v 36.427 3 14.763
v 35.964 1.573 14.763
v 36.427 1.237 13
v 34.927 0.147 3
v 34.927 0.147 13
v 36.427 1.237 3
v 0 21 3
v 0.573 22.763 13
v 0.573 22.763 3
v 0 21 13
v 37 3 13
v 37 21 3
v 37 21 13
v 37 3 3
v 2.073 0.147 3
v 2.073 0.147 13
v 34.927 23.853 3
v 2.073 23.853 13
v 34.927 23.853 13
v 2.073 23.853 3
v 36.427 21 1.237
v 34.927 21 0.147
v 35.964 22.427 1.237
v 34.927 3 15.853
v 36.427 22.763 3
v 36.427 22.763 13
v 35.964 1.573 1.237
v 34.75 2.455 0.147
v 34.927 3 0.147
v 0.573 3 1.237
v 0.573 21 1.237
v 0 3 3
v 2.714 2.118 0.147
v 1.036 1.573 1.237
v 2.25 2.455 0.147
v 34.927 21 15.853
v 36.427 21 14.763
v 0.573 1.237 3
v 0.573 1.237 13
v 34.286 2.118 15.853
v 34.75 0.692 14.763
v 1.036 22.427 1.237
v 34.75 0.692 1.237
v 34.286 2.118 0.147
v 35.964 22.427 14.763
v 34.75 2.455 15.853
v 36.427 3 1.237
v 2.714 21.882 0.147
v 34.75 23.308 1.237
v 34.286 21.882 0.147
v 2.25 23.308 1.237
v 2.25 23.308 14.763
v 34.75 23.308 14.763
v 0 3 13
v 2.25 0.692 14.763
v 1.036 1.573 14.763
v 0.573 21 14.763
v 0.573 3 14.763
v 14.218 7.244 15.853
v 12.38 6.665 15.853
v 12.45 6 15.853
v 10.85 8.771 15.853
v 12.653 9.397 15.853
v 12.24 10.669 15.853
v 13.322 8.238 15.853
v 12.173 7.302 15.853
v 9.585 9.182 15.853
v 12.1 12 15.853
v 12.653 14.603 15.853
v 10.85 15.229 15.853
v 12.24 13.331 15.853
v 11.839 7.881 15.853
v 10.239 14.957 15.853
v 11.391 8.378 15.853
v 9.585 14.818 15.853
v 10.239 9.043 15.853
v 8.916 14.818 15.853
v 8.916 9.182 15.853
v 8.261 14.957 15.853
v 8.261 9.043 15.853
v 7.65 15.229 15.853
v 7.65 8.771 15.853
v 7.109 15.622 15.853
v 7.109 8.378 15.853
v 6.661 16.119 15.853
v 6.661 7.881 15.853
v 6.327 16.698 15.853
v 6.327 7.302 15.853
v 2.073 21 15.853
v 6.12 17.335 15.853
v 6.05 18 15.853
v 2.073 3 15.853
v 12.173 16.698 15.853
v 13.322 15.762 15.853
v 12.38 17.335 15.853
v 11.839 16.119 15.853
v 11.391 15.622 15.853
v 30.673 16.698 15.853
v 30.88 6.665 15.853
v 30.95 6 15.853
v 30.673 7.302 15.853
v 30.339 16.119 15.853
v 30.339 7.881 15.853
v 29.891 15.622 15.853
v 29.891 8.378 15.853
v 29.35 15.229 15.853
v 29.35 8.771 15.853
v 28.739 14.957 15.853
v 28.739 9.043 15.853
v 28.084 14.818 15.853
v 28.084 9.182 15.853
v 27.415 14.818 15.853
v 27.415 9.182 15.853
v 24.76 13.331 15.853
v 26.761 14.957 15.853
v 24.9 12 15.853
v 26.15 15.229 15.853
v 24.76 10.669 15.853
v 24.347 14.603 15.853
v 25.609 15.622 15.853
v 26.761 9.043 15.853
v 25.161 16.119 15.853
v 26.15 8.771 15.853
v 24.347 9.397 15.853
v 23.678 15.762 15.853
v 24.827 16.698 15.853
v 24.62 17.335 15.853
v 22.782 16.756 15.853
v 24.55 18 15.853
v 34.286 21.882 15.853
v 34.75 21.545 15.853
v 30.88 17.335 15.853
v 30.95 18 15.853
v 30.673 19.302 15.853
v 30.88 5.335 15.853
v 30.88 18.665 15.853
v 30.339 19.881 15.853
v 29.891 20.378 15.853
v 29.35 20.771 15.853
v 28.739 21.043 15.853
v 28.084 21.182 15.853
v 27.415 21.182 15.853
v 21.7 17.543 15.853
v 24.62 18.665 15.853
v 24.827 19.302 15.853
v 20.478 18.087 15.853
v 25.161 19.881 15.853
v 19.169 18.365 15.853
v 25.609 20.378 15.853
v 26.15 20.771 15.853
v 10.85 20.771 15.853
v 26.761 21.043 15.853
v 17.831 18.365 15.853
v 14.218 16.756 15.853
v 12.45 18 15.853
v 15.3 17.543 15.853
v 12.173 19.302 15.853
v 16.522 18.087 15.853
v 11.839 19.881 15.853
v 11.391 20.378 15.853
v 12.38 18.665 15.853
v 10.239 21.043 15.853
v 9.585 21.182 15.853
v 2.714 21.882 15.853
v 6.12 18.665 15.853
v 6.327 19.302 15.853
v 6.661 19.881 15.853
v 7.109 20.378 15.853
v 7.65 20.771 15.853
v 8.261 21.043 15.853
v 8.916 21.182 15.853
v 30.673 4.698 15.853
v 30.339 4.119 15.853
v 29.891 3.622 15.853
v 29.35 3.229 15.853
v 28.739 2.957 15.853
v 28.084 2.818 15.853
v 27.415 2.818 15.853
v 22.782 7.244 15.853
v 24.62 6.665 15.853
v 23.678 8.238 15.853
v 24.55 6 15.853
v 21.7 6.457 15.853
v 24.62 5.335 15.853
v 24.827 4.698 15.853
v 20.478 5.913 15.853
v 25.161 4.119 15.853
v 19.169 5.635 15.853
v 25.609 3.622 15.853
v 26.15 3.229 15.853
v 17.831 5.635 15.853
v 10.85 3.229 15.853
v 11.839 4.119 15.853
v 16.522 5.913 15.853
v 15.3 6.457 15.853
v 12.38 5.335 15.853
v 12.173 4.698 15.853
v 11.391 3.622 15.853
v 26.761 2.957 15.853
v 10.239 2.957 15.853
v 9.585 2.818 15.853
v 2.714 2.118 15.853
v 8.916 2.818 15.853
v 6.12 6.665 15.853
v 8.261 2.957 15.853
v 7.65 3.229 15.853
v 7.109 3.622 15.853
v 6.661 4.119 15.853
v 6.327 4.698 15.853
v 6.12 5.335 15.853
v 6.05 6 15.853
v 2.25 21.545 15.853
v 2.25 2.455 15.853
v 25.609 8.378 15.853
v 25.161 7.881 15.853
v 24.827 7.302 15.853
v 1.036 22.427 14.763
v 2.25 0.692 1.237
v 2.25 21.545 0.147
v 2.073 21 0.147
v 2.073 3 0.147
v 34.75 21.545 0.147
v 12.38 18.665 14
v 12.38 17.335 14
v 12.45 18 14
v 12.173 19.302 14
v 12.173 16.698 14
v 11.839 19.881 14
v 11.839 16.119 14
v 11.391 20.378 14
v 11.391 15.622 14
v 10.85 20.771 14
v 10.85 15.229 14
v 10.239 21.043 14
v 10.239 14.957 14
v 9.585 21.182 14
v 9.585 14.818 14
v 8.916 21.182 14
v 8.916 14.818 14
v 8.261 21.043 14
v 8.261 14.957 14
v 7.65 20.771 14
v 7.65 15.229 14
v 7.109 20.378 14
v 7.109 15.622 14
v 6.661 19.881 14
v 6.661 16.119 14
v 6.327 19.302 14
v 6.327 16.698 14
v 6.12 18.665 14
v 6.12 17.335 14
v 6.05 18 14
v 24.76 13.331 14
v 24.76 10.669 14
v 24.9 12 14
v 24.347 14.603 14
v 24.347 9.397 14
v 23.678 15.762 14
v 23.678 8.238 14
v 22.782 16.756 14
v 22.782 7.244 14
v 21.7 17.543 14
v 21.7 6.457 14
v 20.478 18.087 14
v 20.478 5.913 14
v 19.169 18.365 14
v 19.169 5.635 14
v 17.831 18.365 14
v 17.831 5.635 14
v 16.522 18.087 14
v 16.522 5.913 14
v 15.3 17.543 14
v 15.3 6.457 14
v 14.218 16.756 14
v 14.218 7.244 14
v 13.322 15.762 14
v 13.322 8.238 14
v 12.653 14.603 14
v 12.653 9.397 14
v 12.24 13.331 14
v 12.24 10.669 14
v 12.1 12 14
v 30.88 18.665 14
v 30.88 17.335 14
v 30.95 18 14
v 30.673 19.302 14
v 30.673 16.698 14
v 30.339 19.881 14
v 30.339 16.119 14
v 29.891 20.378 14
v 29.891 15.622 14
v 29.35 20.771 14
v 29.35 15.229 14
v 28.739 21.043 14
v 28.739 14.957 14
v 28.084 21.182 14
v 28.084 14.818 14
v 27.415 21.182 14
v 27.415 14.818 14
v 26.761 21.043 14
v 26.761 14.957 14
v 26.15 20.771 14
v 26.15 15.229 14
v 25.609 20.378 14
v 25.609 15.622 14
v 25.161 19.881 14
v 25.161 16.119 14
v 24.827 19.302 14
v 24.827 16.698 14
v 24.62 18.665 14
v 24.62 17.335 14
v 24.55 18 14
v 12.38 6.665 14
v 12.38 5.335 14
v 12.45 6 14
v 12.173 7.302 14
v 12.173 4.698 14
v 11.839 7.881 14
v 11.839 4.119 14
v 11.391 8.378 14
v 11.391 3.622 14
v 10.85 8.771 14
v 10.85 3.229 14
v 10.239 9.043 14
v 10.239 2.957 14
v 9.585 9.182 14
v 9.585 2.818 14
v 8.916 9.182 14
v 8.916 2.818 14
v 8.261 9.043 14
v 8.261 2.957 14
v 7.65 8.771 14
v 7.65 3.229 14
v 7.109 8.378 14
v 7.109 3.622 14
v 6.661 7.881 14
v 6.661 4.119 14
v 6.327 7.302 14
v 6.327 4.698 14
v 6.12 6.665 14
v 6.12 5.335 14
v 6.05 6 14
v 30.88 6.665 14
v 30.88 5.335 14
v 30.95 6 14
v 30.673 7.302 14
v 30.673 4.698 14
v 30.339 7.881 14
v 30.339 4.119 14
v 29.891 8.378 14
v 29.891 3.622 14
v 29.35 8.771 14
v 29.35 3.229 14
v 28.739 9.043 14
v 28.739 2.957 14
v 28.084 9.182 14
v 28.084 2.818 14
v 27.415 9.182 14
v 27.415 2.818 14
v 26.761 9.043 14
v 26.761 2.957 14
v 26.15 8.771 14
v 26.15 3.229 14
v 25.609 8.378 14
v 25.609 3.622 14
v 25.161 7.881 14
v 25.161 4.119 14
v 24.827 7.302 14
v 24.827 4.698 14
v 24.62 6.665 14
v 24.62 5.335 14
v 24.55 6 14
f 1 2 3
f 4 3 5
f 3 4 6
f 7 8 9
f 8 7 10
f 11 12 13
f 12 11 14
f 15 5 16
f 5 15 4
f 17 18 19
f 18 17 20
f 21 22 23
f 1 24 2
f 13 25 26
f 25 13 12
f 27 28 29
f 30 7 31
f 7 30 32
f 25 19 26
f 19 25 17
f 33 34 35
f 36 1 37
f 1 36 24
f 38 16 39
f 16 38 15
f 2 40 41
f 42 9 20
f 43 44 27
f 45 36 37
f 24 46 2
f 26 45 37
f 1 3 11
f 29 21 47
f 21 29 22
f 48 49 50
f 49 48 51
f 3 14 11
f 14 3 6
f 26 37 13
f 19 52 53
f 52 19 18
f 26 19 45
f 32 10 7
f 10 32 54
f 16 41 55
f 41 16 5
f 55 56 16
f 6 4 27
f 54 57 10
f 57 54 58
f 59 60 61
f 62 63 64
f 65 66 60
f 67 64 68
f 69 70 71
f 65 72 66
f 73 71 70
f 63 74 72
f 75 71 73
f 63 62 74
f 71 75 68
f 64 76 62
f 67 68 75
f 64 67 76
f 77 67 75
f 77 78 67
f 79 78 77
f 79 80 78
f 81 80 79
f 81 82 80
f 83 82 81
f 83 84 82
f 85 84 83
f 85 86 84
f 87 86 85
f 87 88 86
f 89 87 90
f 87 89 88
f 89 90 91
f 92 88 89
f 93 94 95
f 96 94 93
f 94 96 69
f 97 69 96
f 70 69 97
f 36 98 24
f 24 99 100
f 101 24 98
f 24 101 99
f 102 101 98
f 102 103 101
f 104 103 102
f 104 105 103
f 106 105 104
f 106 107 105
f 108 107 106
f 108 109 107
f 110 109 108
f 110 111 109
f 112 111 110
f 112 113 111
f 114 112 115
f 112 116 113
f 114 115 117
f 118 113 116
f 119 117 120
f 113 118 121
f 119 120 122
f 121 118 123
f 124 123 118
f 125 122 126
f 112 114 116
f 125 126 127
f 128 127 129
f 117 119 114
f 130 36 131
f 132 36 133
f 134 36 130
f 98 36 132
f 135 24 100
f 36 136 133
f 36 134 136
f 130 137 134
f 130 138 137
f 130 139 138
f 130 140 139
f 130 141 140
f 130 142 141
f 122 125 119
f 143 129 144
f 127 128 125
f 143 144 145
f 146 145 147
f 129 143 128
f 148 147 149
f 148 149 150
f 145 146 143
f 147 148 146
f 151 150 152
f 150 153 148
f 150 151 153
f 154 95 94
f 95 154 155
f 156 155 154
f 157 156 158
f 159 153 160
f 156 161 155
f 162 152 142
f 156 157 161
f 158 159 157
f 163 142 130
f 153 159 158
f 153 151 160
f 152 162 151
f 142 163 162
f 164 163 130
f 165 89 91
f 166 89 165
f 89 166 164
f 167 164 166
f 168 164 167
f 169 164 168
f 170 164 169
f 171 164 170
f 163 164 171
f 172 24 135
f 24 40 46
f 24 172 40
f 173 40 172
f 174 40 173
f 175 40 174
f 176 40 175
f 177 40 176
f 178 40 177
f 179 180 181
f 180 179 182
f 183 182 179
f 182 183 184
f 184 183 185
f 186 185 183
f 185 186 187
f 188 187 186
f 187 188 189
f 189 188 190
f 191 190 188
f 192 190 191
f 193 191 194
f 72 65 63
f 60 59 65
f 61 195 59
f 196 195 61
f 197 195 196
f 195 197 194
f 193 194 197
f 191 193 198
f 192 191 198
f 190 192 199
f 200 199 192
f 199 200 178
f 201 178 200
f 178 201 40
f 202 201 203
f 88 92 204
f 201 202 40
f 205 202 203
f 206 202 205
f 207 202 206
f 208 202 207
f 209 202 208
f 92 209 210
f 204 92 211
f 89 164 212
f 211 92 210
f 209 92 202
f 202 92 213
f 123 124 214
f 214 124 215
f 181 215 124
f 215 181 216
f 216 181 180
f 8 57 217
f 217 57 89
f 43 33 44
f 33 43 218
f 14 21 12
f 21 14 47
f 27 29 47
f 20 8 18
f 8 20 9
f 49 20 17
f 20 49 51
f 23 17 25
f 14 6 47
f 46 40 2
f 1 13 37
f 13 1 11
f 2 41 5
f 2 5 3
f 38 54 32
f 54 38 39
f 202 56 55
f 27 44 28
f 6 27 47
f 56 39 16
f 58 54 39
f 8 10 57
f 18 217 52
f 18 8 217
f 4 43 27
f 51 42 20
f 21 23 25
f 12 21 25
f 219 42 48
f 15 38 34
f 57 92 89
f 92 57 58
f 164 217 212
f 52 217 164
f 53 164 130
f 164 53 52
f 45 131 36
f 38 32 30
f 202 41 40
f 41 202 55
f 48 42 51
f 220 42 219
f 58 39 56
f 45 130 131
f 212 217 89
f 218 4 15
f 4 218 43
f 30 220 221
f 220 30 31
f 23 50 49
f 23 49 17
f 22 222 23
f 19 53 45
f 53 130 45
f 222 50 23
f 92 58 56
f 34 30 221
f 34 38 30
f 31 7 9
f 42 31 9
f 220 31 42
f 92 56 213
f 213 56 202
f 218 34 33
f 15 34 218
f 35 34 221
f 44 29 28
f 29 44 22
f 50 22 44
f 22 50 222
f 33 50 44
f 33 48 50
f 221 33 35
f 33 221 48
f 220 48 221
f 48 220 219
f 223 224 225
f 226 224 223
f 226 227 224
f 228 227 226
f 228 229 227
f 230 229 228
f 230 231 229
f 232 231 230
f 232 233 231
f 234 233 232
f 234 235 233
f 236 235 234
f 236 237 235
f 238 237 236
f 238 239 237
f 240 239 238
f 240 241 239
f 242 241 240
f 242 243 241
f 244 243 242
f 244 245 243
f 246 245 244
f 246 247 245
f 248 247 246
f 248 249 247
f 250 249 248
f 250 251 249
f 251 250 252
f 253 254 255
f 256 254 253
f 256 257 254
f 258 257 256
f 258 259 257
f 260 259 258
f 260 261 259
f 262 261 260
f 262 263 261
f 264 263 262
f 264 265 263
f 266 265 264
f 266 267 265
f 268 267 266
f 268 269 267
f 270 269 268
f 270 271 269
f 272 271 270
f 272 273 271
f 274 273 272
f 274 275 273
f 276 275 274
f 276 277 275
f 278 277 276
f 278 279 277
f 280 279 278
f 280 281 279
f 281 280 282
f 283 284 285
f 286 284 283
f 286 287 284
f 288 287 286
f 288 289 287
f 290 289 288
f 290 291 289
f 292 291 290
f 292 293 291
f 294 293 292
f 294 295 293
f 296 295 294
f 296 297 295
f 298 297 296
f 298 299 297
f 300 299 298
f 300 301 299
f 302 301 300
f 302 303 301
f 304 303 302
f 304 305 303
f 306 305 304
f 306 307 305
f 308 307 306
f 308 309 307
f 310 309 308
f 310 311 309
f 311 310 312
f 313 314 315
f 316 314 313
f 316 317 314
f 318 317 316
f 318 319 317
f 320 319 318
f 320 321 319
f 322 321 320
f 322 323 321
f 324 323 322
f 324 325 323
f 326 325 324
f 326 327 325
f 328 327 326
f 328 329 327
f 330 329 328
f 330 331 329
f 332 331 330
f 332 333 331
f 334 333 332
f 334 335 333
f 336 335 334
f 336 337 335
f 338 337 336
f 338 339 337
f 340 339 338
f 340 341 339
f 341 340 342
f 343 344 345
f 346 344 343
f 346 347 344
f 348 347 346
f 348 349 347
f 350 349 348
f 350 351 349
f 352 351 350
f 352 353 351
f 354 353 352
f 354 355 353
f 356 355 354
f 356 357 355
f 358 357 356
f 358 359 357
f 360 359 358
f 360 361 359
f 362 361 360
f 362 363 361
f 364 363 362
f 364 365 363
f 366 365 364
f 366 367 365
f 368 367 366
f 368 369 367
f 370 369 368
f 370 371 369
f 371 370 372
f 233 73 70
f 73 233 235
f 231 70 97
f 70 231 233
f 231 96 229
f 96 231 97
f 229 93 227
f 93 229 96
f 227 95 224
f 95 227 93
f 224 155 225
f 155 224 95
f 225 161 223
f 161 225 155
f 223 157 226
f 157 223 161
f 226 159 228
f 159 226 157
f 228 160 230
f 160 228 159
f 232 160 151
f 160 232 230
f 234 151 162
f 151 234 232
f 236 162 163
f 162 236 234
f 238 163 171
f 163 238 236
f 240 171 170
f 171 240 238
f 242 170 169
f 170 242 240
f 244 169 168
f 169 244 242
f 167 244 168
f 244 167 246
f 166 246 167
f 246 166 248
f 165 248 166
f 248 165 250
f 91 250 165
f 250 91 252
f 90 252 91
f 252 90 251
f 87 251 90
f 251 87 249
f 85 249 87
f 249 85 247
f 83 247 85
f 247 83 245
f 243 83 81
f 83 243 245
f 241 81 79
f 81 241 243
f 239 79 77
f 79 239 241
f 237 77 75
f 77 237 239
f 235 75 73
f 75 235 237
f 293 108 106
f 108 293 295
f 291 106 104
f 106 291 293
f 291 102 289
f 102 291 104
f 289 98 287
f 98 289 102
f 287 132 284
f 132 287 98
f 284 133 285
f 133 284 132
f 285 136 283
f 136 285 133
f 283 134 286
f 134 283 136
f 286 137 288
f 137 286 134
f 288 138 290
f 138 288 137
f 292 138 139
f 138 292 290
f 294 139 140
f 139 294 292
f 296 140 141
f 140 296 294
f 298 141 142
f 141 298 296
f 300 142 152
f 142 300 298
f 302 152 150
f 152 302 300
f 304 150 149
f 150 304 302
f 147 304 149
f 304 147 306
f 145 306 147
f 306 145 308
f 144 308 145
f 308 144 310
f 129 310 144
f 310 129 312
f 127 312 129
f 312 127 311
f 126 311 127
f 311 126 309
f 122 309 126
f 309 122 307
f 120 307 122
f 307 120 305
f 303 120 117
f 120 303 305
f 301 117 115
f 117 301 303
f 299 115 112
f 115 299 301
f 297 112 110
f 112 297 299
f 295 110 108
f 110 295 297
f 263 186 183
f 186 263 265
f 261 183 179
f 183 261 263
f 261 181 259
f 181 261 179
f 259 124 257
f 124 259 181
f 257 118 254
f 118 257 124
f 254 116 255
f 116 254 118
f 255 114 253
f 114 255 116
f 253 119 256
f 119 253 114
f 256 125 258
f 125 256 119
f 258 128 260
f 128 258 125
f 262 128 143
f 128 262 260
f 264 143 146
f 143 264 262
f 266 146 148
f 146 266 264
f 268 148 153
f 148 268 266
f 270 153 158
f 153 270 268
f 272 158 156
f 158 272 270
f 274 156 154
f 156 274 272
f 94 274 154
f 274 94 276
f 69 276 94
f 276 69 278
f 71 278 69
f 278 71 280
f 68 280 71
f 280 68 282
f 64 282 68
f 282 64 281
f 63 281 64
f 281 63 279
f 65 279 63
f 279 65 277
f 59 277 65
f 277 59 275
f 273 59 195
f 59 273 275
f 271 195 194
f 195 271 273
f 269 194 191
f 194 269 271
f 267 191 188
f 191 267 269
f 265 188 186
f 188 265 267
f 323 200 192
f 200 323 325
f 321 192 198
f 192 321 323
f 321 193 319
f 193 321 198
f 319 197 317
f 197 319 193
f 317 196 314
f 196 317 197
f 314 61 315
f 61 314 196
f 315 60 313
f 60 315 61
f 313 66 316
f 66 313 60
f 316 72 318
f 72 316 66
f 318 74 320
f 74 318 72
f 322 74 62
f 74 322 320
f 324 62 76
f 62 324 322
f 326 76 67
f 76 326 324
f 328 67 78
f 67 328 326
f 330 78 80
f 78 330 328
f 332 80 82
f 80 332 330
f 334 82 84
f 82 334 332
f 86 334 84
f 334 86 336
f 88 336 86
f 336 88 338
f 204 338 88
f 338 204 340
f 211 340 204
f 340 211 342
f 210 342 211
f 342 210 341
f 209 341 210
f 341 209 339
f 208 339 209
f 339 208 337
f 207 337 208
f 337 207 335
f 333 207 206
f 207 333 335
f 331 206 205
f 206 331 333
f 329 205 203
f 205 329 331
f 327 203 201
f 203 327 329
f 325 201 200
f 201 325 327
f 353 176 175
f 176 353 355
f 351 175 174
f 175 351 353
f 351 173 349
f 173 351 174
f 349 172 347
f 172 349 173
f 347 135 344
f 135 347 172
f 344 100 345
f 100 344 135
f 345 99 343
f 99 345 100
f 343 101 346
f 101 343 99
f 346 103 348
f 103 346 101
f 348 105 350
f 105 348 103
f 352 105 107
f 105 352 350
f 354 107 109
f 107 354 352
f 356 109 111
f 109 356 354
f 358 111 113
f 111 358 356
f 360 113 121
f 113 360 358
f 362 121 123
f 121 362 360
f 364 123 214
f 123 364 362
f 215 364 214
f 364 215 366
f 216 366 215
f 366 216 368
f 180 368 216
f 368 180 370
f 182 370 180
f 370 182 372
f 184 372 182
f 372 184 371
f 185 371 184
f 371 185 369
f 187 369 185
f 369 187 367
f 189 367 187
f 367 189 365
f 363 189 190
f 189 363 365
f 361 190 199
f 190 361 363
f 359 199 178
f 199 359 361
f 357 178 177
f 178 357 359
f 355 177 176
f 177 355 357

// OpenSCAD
TILE_WIDTH = 37;
TILE_HEIGHT = 24;
TILE_DEPTH = 16;
CORNER_RADIUS = 3;
STAMP_DEPTH = 2;

stamped_tile(5) circle(2*TILE_HEIGHT/3);

module star(radius) {
  angle = 72; // 360/5;
  union() {
    polygon(
      points = [for (i = [0 : 4]) [radius * cos(3 * i * angle), radius * sin(3 * i * angle)] ]
    );
    golden_ratio = (1 + sqrt(5))/2;
    factor = 1/(1 + golden_ratio);
    rotate([0, 0, angle/2]) pentagon(factor * radius);
  }
}

module pentagon(radius) {
  angle = 72; // 360/5;
  polygon(
    points = [for (i = [0 : 4]) [radius * cos(i * angle), radius * sin(i * angle)] ]
  );
}

module tile_set() {
  xoffset = 1.2 * TILE_WIDTH;
  yoffset = 1.2 * TILE_HEIGHT;
  translate([0 * xoffset, 0 * yoffset, 0]) stamped_tile(1) children();
  translate([1 * xoffset, 0 * yoffset, 0]) stamped_tile(1) children();
  translate([0 * xoffset, 1 * yoffset, 0]) stamped_tile(1) children();
  translate([1 * xoffset, 1 * yoffset, 0]) stamped_tile(2) children();
  translate([0 * xoffset, 2 * yoffset, 0]) stamped_tile(2) children();
  translate([1 * xoffset, 2 * yoffset, 0]) stamped_tile(3) children();
  translate([0 * xoffset, 3 * yoffset, 0]) stamped_tile(3) children();
  translate([1 * xoffset, 3 * yoffset, 0]) stamped_tile(4) children();
  translate([0 * xoffset, 4 * yoffset, 0]) stamped_tile(4) children();
  translate([1 * xoffset, 4 * yoffset, 0]) stamped_tile(5) children();
}

module stamped_tile(n) {
  difference() {
    tile(TILE_WIDTH, TILE_HEIGHT, TILE_DEPTH, CORNER_RADIUS);
    translate([TILE_WIDTH/2, TILE_HEIGHT/2, TILE_DEPTH]) stamp(STAMP_DEPTH) pattern(n) children();
  }
}

module tile(width, height, depth, radius) {
  translate([radius, radius, radius]) minkowski() {
    cube([width-2*radius, height-2*radius, depth - 2*radius]);
    sphere(radius);
  }
}

module stamp(depth) {
  translate([0, 0, -depth]){
    linear_extrude(height = 2*depth) children();
  }
}

module pattern(n) {
  if (n == 1) {
    scaling = 0.5;
    scale(scaling) children();
  }
  if (n == 2) {
    scaling = 0.4;
    union() {
      translate([-TILE_WIDTH/4, 0, 0]) scale(scaling) children();
      translate([ TILE_WIDTH/4, 0, 0]) scale(scaling) children();
    }
  }
  if (n == 3) {
    scaling = 0.25;
    union() {
      translate([-TILE_WIDTH/4, -TILE_HEIGHT/5, 0]) scale(scaling) children();
      translate([            0,              0, 0]) scale(scaling) children();
      translate([ TILE_WIDTH/4,  TILE_HEIGHT/5, 0]) scale(scaling) children();
    }
  }
  if (n == 4) {
    scaling = 0.25;
    union() {
      translate([-TILE_WIDTH/4,              0, 0]) scale(scaling) children();
      translate([ TILE_WIDTH/4,              0, 0]) scale(scaling) children();
      translate([            0, -TILE_HEIGHT/4, 0]) scale(scaling) children();
      translate([            0,  TILE_HEIGHT/4, 0]) scale(scaling) children();
    }
  }
  if (n == 5) {
    scaling = 0.2;
    union() {
      scale(0.4) children();
      translate([-TILE_WIDTH/4, -TILE_HEIGHT/4, 0]) scale(scaling) children();
      translate([-TILE_WIDTH/4,  TILE_HEIGHT/4, 0]) scale(scaling) children();
      translate([ TILE_WIDTH/4, -TILE_HEIGHT/4, 0]) scale(scaling) children();
      translate([ TILE_WIDTH/4,  TILE_HEIGHT/4, 0]) scale(scaling) children();
    }
  }
}
